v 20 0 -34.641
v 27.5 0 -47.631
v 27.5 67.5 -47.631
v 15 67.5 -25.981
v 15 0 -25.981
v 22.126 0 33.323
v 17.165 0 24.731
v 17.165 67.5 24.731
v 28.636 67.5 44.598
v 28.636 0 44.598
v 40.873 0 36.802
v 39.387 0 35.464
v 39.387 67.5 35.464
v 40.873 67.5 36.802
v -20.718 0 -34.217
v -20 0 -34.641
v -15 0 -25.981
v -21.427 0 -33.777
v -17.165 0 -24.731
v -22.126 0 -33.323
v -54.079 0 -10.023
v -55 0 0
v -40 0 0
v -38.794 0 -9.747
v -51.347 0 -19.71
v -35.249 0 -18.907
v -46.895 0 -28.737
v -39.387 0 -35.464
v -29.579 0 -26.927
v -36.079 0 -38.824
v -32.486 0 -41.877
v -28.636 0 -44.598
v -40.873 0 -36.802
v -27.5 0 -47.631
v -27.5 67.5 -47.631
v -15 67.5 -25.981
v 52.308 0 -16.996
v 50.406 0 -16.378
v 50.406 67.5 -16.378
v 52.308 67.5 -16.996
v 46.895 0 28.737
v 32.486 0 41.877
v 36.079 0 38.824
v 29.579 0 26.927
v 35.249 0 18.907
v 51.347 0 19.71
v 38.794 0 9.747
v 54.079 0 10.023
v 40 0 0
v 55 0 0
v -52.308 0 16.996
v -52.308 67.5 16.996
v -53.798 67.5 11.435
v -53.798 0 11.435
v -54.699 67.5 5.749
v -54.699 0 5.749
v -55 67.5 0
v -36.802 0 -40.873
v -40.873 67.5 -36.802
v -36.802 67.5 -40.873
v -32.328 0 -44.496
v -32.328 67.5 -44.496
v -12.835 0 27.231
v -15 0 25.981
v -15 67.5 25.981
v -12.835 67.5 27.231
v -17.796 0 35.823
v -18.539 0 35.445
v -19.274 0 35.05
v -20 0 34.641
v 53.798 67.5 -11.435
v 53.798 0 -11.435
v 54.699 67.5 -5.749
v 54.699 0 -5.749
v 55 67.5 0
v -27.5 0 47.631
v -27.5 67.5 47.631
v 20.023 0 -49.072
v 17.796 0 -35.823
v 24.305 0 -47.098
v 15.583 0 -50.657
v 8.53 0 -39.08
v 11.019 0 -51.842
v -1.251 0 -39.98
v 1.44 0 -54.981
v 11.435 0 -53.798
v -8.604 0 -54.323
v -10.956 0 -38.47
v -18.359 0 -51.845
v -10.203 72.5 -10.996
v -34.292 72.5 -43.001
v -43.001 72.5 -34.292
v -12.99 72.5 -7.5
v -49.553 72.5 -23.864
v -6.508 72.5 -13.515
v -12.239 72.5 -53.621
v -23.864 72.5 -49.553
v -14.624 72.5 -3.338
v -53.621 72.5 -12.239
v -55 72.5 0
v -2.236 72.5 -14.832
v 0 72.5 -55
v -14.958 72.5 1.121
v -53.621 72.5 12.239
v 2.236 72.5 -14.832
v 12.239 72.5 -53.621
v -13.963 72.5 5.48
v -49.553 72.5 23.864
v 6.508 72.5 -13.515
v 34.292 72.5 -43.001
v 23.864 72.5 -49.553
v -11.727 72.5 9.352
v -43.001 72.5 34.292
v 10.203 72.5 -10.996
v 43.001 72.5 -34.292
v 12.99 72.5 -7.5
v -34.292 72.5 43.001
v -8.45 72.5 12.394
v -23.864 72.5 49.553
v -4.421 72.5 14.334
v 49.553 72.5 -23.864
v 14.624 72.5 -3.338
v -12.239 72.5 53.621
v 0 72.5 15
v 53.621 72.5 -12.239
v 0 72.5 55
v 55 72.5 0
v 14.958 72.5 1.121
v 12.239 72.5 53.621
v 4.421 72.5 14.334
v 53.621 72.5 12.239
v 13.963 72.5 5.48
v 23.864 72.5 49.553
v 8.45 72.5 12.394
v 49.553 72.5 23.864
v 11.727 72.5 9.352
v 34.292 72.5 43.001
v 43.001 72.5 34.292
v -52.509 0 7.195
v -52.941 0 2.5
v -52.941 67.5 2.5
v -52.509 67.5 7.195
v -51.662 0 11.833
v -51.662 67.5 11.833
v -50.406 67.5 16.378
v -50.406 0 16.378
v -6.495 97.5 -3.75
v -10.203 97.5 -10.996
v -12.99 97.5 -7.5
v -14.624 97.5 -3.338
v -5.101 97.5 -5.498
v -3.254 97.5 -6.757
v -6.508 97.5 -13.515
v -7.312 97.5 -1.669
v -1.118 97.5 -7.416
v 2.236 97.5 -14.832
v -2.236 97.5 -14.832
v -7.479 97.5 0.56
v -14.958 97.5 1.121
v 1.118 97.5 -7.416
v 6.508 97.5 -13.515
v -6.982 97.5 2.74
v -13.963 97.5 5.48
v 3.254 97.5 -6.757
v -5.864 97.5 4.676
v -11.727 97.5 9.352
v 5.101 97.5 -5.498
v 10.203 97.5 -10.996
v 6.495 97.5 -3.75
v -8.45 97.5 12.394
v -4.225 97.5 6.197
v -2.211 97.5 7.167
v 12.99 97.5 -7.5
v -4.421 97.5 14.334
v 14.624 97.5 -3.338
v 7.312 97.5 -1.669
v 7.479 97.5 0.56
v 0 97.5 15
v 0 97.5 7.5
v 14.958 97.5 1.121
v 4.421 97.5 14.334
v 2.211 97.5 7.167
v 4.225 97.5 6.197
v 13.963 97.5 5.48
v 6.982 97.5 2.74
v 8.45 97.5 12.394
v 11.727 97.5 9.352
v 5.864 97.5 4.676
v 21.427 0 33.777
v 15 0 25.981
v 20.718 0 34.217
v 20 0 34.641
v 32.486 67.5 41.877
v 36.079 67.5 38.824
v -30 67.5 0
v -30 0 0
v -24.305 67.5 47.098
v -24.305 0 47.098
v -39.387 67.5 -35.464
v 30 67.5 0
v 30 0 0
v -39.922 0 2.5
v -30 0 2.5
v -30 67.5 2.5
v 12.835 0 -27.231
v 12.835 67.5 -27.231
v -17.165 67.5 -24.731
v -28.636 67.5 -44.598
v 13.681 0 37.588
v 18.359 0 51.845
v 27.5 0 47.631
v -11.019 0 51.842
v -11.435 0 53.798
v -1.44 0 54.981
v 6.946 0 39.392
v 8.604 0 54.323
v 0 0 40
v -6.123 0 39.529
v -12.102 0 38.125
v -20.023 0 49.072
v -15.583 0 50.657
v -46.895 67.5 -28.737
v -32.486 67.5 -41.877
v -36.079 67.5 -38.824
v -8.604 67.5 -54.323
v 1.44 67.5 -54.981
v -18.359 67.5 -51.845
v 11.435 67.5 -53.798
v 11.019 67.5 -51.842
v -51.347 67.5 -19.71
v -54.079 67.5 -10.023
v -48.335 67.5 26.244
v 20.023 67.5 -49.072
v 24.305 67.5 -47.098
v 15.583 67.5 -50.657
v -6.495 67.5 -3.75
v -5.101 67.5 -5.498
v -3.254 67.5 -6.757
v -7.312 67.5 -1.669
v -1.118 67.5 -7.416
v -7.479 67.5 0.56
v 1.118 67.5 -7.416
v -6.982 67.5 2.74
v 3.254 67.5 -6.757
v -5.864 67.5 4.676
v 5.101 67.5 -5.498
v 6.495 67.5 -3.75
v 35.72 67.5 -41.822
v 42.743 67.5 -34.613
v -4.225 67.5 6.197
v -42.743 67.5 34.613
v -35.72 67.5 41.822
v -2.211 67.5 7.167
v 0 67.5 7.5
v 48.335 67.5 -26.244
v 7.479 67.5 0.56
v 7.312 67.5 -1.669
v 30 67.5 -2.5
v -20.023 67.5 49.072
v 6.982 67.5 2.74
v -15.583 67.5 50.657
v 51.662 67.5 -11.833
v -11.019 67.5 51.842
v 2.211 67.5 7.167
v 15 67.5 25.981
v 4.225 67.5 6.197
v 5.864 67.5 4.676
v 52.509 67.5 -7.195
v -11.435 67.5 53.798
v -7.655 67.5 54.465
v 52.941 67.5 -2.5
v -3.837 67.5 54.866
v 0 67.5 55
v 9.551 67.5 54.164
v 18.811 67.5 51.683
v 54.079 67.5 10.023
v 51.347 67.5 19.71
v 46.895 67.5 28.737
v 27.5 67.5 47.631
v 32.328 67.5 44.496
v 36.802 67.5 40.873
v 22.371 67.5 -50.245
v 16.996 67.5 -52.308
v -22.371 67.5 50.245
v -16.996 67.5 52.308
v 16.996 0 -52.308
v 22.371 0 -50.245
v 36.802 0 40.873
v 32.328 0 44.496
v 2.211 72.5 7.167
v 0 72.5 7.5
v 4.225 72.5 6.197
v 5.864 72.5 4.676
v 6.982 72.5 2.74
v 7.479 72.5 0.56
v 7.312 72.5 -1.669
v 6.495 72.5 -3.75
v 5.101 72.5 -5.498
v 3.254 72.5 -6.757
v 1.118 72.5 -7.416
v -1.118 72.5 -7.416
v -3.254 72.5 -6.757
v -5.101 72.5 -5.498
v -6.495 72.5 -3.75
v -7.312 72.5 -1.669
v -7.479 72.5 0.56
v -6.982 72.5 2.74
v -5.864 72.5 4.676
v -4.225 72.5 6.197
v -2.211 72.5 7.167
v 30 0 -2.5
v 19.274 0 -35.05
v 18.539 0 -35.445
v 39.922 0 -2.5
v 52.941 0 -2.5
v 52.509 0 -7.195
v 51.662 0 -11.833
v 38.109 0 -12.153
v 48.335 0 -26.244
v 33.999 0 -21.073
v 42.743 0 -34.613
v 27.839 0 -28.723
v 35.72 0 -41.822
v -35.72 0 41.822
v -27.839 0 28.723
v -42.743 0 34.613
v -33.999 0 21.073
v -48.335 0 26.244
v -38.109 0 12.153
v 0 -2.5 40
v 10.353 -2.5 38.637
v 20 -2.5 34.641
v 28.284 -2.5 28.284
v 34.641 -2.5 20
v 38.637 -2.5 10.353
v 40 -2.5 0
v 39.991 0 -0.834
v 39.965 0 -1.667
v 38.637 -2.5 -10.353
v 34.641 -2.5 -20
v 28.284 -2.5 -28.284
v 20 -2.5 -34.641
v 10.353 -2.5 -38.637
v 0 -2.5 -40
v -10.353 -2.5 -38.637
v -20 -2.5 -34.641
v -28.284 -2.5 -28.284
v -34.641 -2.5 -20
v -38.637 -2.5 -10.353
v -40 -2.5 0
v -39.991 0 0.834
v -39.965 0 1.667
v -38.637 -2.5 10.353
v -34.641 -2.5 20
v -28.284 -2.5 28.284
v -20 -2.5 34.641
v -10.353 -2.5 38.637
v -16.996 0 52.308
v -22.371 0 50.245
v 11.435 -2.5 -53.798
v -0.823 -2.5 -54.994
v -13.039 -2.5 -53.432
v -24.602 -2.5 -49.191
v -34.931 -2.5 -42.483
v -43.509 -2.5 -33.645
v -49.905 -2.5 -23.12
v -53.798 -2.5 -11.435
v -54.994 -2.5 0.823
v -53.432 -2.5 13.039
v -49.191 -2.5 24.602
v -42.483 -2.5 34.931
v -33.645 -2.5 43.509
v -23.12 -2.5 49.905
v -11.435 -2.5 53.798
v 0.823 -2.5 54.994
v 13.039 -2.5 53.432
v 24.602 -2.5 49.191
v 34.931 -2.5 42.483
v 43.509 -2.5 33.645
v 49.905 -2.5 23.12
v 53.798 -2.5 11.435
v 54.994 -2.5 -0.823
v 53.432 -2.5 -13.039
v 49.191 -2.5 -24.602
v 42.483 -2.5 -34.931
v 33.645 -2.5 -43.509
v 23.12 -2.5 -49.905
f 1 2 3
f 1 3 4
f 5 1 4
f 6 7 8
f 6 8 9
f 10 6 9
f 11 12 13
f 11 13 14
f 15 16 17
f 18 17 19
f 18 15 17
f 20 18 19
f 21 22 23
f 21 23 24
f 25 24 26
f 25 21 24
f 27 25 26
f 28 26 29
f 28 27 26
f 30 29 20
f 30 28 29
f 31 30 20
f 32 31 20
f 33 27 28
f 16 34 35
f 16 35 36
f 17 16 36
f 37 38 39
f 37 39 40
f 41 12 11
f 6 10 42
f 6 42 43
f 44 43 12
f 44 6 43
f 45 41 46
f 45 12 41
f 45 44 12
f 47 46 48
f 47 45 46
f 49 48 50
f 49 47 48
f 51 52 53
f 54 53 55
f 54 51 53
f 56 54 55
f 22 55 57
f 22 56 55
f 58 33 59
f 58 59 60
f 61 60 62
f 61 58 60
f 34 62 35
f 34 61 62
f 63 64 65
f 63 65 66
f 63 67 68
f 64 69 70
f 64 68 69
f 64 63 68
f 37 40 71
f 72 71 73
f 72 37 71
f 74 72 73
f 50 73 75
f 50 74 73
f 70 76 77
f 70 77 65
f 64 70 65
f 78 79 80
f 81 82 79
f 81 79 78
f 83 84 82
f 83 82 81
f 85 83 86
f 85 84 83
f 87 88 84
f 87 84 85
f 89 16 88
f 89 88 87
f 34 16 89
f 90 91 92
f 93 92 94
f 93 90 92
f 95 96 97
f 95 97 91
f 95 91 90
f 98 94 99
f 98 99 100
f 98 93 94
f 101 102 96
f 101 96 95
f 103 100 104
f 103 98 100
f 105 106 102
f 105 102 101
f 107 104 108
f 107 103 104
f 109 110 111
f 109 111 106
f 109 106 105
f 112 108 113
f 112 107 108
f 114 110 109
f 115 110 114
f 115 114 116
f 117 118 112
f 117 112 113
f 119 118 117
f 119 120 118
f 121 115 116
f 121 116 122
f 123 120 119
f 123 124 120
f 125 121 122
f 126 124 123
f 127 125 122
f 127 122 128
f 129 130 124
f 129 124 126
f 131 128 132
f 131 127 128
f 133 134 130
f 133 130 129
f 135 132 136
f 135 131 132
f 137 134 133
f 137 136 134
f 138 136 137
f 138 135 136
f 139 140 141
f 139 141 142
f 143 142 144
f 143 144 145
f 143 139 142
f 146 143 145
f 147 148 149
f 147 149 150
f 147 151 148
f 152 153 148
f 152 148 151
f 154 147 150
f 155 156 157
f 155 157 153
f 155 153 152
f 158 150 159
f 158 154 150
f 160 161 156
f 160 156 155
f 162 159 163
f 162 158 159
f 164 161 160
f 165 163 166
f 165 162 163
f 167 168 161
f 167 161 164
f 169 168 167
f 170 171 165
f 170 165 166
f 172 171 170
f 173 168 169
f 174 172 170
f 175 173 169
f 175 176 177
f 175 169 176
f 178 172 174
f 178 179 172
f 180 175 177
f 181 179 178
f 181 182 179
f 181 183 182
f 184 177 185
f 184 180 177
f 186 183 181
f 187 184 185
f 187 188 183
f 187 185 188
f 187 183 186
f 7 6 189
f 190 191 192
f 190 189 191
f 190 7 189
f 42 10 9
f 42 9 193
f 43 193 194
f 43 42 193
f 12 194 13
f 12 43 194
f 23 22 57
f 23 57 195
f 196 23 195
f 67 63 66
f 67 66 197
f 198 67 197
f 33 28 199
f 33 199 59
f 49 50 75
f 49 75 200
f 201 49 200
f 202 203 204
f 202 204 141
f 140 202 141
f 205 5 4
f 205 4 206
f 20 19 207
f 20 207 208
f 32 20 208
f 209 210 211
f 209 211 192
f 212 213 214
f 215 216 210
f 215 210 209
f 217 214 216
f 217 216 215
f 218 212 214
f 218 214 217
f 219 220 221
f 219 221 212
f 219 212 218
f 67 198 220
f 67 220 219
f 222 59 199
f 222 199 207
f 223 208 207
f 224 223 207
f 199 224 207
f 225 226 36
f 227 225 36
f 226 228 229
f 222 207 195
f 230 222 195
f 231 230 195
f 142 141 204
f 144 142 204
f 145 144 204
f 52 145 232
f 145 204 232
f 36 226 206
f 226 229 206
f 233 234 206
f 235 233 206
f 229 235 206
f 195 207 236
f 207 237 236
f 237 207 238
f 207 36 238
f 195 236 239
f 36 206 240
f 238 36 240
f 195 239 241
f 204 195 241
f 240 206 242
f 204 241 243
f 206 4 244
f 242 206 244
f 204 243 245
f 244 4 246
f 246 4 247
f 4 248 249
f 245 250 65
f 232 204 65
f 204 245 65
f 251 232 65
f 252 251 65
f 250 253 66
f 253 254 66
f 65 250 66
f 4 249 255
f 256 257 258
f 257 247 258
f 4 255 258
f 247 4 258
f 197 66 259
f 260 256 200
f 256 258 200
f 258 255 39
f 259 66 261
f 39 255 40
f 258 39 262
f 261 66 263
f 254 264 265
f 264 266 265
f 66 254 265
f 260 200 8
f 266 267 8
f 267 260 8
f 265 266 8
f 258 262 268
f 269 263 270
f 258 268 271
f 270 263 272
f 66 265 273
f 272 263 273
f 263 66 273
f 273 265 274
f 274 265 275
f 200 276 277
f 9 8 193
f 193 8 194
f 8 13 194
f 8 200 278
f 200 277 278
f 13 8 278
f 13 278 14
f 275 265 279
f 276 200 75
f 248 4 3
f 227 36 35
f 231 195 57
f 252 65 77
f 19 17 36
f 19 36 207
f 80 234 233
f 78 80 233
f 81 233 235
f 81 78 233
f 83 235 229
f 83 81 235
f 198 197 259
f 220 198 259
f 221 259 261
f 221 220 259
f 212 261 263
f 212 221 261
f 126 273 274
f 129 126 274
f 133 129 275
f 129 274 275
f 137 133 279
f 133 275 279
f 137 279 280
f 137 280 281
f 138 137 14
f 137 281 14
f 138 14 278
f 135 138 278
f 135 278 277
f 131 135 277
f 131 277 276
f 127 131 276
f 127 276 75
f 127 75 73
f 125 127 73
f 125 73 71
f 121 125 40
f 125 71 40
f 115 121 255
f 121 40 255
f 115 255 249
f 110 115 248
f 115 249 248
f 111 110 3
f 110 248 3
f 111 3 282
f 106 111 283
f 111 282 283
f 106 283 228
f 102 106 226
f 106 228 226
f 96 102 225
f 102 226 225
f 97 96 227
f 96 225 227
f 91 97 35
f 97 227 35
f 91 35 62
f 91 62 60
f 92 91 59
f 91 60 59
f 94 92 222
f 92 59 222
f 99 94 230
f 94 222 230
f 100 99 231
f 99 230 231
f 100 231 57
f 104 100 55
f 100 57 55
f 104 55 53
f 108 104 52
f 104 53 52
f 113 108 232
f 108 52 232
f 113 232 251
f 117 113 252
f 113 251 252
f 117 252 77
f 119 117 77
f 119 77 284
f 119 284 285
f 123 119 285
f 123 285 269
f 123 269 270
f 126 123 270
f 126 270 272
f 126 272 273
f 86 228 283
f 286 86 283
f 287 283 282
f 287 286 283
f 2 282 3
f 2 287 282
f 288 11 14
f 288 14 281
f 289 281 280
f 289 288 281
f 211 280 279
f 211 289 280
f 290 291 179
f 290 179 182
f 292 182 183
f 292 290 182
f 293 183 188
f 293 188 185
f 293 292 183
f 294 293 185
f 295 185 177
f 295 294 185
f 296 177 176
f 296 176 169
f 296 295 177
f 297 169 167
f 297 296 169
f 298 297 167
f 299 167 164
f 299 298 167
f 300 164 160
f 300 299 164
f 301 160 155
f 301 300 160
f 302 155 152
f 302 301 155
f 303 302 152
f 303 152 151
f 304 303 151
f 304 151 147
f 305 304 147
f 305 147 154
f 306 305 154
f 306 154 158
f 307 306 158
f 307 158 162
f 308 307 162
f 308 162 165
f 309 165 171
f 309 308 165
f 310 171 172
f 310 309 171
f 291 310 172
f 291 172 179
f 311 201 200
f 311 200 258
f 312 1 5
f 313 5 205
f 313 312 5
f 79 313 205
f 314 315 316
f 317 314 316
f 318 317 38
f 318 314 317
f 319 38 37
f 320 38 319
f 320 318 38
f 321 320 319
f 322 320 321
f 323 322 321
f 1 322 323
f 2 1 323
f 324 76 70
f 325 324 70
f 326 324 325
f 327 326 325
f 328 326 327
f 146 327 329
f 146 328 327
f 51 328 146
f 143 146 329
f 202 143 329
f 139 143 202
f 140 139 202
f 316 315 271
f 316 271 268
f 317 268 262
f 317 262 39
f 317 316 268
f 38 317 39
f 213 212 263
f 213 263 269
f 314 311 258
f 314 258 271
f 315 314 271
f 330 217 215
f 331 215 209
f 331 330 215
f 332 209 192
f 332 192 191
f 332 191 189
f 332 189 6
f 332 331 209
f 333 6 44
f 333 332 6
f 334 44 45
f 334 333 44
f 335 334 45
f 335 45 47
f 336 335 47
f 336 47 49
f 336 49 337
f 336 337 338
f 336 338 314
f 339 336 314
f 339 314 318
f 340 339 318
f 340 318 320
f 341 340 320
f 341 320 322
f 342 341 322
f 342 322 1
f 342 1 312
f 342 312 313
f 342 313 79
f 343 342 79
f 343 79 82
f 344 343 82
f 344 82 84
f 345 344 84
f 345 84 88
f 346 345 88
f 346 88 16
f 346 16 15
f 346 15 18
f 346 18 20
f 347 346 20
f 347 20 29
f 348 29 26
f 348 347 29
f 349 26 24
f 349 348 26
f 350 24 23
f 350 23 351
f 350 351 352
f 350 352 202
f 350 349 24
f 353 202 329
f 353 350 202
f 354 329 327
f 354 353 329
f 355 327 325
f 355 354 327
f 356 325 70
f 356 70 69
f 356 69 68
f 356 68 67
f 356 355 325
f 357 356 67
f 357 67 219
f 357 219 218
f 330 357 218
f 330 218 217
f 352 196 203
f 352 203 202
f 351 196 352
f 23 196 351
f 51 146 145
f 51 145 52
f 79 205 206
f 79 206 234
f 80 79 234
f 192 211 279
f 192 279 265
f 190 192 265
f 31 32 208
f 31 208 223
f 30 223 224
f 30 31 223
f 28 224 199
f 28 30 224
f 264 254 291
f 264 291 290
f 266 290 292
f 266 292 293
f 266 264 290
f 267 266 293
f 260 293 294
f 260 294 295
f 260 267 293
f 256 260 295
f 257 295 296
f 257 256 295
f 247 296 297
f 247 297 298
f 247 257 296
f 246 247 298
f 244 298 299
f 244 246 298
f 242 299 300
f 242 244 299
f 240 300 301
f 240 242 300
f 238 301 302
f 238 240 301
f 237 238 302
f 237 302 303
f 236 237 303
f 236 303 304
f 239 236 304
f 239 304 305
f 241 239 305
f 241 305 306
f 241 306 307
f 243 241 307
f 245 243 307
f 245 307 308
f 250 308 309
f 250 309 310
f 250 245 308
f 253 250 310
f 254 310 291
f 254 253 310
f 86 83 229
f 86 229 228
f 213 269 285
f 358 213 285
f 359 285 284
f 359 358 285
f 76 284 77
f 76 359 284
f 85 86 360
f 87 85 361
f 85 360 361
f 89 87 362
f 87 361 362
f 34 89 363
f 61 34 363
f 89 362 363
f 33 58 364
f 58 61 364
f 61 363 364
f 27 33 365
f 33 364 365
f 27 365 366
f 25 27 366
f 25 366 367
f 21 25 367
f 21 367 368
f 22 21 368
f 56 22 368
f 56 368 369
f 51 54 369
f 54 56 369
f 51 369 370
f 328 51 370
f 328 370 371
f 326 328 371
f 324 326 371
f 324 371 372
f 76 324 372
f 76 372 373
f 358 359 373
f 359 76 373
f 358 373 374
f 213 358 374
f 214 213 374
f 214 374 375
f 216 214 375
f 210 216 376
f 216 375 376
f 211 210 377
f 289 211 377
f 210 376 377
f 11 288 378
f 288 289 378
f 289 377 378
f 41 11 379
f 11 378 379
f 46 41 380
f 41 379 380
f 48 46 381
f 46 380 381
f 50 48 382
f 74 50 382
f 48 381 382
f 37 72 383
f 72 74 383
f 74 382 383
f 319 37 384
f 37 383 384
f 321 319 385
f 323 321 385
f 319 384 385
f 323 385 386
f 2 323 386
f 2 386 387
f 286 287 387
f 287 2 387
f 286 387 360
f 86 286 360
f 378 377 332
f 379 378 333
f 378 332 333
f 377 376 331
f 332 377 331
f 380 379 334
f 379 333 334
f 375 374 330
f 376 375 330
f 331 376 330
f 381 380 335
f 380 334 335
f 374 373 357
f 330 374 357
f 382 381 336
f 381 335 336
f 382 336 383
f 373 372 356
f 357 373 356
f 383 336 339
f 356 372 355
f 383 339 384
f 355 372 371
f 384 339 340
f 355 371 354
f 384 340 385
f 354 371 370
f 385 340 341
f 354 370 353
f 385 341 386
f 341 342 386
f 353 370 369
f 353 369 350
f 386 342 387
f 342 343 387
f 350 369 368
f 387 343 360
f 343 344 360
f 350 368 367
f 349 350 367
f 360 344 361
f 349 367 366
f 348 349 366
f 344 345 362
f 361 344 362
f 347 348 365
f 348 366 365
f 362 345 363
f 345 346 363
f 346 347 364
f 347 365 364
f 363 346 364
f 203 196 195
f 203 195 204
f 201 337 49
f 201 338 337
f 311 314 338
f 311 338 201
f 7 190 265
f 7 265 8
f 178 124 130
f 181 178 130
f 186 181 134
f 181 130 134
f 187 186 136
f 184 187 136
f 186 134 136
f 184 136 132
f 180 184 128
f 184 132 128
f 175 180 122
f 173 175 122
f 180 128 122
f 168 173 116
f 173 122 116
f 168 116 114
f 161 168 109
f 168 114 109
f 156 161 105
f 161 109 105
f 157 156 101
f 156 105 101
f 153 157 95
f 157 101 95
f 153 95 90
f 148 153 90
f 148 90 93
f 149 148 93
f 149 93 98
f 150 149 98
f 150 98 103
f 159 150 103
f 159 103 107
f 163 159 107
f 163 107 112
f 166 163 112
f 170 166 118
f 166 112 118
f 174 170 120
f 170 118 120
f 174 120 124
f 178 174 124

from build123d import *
from build123d.topology import SkipClean

# Parameters (mm, degrees)
BOSS_EXTRUDE1_DEPTH   = 67.5
BOSS_EXTRUDE1_2_DEPTH = 67.5
BOSS_EXTRUDE1_3_DEPTH = 67.5
BOSS_EXTRUDE1_4_DEPTH = 67.5
BOSS_EXTRUDE1_5_DEPTH = 67.5
BOSS_EXTRUDE1_6_DEPTH = 67.5
BOSS_EXTRUDE2_START   = -2.5
SKETCH2_R             = 55
SKETCH2_R_2           = 40
BOSS_EXTRUDE2_DEPTH   = 2.5
BOSS_EXTRUDE3_START   = 67.5
SKETCH3_R             = 55
SKETCH3_R_2           = 7.5
BOSS_EXTRUDE3_DEPTH   = 5
SKETCH4_R             = 15
SKETCH4_R_2           = 7.5
BOSS_EXTRUDE4_DEPTH   = 25


with BuildPart() as part:
    # Sketch1 → Boss-Extrude1 (new body)
    with BuildSketch(Plane(origin=(0, 0, 0), x_dir=(1, 0, 0), z_dir=(0, 1, 0))):
        with BuildLine():
            Line((55, 0), (30, 0))
            Line((30, 0), (30, 2.5))
            Line((30, 2.5), (52.941004902, 2.5))
            ThreePointArc((52.941004902, 2.5), (52.137315312, 9.523673244), (50.405995364, 16.377900702))
            Line((50.405995364, 16.377900702), (52.308108396, 16.995934691))
            ThreePointArc((52.308108396, 16.995934691), (54.322858733, 8.603895577), (55, 0))
        make_face()
    extrude(amount=BOSS_EXTRUDE1_DEPTH)



with BuildPart() as body_2:
    # Sketch1 → Boss-Extrude1 2 (new body)
    with BuildSketch(Plane(origin=(0, 0, 0), x_dir=(1, 0, 0), z_dir=(0, 1, 0))):
        with BuildLine():
            Line((27.5, -47.631397208), (15, -25.980762114))
            Line((15, -25.980762114), (17.165063509, -24.730762114))
            Line((17.165063509, -24.730762114), (28.63556596, -44.598255147))
            ThreePointArc((28.63556596, -44.598255147), (34.316400623, -40.390402923), (39.38667575, -35.463922137))
            Line((39.38667575, -35.463922137), (40.872965401, -36.80218335))
            ThreePointArc((40.872965401, -36.80218335), (34.612621508, -42.74302788), (27.5, -47.631397208))
        make_face()
    extrude(amount=BOSS_EXTRUDE1_2_DEPTH)


with BuildPart() as body_3:
    # Sketch1 → Boss-Extrude1 3 (new body)
    with BuildSketch(Plane(origin=(0, 0, 0), x_dir=(1, 0, 0), z_dir=(0, 1, 0))):
        with BuildLine():
            Line((-27.5, -47.631397208), (-15, -25.980762114))
            Line((-15, -25.980762114), (-12.834936491, -27.230762114))
            Line((-12.834936491, -27.230762114), (-24.305438941, -47.098255147))
            ThreePointArc((-24.305438941, -47.098255147), (-17.820914689, -49.914076167), (-11.019319613, -51.841822839))
            Line((-11.019319613, -51.841822839), (-11.435142995, -53.79811804))
            ThreePointArc((-11.435142995, -53.79811804), (-19.710237225, -51.346923457), (-27.5, -47.631397208))
        make_face()
    extrude(amount=BOSS_EXTRUDE1_3_DEPTH)


with BuildPart() as body_4:
    # Sketch1 → Boss-Extrude1 4 (new body)
    with BuildSketch(Plane(origin=(0, 0, 0), x_dir=(1, 0, 0), z_dir=(0, 1, 0))):
        with BuildLine():
            Line((-55, 0), (-30, 0))
            Line((-30, 0), (-30, -2.5))
            Line((-30, -2.5), (-52.941004902, -2.5))
            ThreePointArc((-52.941004902, -2.5), (-52.137315312, -9.523673244), (-50.405995364, -16.377900702))
            Line((-50.405995364, -16.377900702), (-52.308108396, -16.995934691))
            ThreePointArc((-52.308108396, -16.995934691), (-54.322858733, -8.603895577), (-55, 0))
        make_face()
    extrude(amount=BOSS_EXTRUDE1_4_DEPTH)


with BuildPart() as body_5:
    # Sketch1 → Boss-Extrude1 5 (new body)
    with BuildSketch(Plane(origin=(0, 0, 0), x_dir=(1, 0, 0), z_dir=(0, 1, 0))):
        with BuildLine():
            Line((-27.5, 47.631397208), (-15, 25.980762114))
            Line((-15, 25.980762114), (-17.165063509, 24.730762114))
            Line((-17.165063509, 24.730762114), (-28.63556596, 44.598255147))
            ThreePointArc((-28.63556596, 44.598255147), (-34.316400623, 40.390402923), (-39.38667575, 35.463922137))
            Line((-39.38667575, 35.463922137), (-40.872965401, 36.80218335))
            ThreePointArc((-40.872965401, 36.80218335), (-34.612621508, 42.74302788), (-27.5, 47.631397208))
        make_face()
    extrude(amount=BOSS_EXTRUDE1_5_DEPTH)


with BuildPart() as body_6:
    # Sketch1 → Boss-Extrude1 6 (new body)
    with BuildSketch(Plane(origin=(0, 0, 0), x_dir=(1, 0, 0), z_dir=(0, 1, 0))):
        with BuildLine():
            Line((27.5, 47.631397208), (15, 25.980762114))
            Line((15, 25.980762114), (12.834936491, 27.230762114))
            Line((12.834936491, 27.230762114), (24.305438941, 47.098255147))
            ThreePointArc((24.305438941, 47.098255147), (17.820914689, 49.914076167), (11.019319613, 51.841822839))
            Line((11.019319613, 51.841822839), (11.435142995, 53.79811804))
            ThreePointArc((11.435142995, 53.79811804), (19.710237225, 51.346923457), (27.5, 47.631397208))
        make_face()
    extrude(amount=BOSS_EXTRUDE1_6_DEPTH)


with BuildPart() as part_1:
    with SkipClean():  # the faces are left unmerged after this step: merging them gives an invalid solid
        add(part.part)

        add(body_2.part)  # Boss-Extrude2 merges body 2

        add(body_3.part)  # Boss-Extrude2 merges body 3

        add(body_4.part)  # Boss-Extrude2 merges body 4

        add(body_5.part)  # Boss-Extrude2 merges body 5

        add(body_6.part)  # Boss-Extrude2 merges body 6
        # Sketch2 → Boss-Extrude2 (add)
        with BuildSketch(Plane(origin=(0, 0, 0), x_dir=(1, 0, 0), z_dir=(0, 1, 0)).offset(BOSS_EXTRUDE2_START)):
            Circle(SKETCH2_R)
            Circle(SKETCH2_R_2, mode=Mode.SUBTRACT)
        extrude(amount=BOSS_EXTRUDE2_DEPTH)

    # Sketch3 → Boss-Extrude3 (add)
    with SkipClean():  # the faces are left unmerged after this step: merging them gives an invalid solid
        with BuildSketch(Plane(origin=(0, 0, 0), x_dir=(1, 0, 0), z_dir=(0, 1, 0)).offset(BOSS_EXTRUDE3_START)):
            Circle(SKETCH3_R)
            Circle(SKETCH3_R_2, mode=Mode.SUBTRACT)
        extrude(amount=BOSS_EXTRUDE3_DEPTH)

    # Sketch4 → Boss-Extrude4 (add)
    with SkipClean():  # the faces are left unmerged after this step: merging them gives an invalid solid
        with BuildSketch(Plane(origin=(0, 72.5, 0), x_dir=(1, 0, 0), z_dir=(0, 1, 0))):
            Circle(SKETCH4_R)
            Circle(SKETCH4_R_2, mode=Mode.SUBTRACT)
        extrude(amount=BOSS_EXTRUDE4_DEPTH)


solid = part_1.part
